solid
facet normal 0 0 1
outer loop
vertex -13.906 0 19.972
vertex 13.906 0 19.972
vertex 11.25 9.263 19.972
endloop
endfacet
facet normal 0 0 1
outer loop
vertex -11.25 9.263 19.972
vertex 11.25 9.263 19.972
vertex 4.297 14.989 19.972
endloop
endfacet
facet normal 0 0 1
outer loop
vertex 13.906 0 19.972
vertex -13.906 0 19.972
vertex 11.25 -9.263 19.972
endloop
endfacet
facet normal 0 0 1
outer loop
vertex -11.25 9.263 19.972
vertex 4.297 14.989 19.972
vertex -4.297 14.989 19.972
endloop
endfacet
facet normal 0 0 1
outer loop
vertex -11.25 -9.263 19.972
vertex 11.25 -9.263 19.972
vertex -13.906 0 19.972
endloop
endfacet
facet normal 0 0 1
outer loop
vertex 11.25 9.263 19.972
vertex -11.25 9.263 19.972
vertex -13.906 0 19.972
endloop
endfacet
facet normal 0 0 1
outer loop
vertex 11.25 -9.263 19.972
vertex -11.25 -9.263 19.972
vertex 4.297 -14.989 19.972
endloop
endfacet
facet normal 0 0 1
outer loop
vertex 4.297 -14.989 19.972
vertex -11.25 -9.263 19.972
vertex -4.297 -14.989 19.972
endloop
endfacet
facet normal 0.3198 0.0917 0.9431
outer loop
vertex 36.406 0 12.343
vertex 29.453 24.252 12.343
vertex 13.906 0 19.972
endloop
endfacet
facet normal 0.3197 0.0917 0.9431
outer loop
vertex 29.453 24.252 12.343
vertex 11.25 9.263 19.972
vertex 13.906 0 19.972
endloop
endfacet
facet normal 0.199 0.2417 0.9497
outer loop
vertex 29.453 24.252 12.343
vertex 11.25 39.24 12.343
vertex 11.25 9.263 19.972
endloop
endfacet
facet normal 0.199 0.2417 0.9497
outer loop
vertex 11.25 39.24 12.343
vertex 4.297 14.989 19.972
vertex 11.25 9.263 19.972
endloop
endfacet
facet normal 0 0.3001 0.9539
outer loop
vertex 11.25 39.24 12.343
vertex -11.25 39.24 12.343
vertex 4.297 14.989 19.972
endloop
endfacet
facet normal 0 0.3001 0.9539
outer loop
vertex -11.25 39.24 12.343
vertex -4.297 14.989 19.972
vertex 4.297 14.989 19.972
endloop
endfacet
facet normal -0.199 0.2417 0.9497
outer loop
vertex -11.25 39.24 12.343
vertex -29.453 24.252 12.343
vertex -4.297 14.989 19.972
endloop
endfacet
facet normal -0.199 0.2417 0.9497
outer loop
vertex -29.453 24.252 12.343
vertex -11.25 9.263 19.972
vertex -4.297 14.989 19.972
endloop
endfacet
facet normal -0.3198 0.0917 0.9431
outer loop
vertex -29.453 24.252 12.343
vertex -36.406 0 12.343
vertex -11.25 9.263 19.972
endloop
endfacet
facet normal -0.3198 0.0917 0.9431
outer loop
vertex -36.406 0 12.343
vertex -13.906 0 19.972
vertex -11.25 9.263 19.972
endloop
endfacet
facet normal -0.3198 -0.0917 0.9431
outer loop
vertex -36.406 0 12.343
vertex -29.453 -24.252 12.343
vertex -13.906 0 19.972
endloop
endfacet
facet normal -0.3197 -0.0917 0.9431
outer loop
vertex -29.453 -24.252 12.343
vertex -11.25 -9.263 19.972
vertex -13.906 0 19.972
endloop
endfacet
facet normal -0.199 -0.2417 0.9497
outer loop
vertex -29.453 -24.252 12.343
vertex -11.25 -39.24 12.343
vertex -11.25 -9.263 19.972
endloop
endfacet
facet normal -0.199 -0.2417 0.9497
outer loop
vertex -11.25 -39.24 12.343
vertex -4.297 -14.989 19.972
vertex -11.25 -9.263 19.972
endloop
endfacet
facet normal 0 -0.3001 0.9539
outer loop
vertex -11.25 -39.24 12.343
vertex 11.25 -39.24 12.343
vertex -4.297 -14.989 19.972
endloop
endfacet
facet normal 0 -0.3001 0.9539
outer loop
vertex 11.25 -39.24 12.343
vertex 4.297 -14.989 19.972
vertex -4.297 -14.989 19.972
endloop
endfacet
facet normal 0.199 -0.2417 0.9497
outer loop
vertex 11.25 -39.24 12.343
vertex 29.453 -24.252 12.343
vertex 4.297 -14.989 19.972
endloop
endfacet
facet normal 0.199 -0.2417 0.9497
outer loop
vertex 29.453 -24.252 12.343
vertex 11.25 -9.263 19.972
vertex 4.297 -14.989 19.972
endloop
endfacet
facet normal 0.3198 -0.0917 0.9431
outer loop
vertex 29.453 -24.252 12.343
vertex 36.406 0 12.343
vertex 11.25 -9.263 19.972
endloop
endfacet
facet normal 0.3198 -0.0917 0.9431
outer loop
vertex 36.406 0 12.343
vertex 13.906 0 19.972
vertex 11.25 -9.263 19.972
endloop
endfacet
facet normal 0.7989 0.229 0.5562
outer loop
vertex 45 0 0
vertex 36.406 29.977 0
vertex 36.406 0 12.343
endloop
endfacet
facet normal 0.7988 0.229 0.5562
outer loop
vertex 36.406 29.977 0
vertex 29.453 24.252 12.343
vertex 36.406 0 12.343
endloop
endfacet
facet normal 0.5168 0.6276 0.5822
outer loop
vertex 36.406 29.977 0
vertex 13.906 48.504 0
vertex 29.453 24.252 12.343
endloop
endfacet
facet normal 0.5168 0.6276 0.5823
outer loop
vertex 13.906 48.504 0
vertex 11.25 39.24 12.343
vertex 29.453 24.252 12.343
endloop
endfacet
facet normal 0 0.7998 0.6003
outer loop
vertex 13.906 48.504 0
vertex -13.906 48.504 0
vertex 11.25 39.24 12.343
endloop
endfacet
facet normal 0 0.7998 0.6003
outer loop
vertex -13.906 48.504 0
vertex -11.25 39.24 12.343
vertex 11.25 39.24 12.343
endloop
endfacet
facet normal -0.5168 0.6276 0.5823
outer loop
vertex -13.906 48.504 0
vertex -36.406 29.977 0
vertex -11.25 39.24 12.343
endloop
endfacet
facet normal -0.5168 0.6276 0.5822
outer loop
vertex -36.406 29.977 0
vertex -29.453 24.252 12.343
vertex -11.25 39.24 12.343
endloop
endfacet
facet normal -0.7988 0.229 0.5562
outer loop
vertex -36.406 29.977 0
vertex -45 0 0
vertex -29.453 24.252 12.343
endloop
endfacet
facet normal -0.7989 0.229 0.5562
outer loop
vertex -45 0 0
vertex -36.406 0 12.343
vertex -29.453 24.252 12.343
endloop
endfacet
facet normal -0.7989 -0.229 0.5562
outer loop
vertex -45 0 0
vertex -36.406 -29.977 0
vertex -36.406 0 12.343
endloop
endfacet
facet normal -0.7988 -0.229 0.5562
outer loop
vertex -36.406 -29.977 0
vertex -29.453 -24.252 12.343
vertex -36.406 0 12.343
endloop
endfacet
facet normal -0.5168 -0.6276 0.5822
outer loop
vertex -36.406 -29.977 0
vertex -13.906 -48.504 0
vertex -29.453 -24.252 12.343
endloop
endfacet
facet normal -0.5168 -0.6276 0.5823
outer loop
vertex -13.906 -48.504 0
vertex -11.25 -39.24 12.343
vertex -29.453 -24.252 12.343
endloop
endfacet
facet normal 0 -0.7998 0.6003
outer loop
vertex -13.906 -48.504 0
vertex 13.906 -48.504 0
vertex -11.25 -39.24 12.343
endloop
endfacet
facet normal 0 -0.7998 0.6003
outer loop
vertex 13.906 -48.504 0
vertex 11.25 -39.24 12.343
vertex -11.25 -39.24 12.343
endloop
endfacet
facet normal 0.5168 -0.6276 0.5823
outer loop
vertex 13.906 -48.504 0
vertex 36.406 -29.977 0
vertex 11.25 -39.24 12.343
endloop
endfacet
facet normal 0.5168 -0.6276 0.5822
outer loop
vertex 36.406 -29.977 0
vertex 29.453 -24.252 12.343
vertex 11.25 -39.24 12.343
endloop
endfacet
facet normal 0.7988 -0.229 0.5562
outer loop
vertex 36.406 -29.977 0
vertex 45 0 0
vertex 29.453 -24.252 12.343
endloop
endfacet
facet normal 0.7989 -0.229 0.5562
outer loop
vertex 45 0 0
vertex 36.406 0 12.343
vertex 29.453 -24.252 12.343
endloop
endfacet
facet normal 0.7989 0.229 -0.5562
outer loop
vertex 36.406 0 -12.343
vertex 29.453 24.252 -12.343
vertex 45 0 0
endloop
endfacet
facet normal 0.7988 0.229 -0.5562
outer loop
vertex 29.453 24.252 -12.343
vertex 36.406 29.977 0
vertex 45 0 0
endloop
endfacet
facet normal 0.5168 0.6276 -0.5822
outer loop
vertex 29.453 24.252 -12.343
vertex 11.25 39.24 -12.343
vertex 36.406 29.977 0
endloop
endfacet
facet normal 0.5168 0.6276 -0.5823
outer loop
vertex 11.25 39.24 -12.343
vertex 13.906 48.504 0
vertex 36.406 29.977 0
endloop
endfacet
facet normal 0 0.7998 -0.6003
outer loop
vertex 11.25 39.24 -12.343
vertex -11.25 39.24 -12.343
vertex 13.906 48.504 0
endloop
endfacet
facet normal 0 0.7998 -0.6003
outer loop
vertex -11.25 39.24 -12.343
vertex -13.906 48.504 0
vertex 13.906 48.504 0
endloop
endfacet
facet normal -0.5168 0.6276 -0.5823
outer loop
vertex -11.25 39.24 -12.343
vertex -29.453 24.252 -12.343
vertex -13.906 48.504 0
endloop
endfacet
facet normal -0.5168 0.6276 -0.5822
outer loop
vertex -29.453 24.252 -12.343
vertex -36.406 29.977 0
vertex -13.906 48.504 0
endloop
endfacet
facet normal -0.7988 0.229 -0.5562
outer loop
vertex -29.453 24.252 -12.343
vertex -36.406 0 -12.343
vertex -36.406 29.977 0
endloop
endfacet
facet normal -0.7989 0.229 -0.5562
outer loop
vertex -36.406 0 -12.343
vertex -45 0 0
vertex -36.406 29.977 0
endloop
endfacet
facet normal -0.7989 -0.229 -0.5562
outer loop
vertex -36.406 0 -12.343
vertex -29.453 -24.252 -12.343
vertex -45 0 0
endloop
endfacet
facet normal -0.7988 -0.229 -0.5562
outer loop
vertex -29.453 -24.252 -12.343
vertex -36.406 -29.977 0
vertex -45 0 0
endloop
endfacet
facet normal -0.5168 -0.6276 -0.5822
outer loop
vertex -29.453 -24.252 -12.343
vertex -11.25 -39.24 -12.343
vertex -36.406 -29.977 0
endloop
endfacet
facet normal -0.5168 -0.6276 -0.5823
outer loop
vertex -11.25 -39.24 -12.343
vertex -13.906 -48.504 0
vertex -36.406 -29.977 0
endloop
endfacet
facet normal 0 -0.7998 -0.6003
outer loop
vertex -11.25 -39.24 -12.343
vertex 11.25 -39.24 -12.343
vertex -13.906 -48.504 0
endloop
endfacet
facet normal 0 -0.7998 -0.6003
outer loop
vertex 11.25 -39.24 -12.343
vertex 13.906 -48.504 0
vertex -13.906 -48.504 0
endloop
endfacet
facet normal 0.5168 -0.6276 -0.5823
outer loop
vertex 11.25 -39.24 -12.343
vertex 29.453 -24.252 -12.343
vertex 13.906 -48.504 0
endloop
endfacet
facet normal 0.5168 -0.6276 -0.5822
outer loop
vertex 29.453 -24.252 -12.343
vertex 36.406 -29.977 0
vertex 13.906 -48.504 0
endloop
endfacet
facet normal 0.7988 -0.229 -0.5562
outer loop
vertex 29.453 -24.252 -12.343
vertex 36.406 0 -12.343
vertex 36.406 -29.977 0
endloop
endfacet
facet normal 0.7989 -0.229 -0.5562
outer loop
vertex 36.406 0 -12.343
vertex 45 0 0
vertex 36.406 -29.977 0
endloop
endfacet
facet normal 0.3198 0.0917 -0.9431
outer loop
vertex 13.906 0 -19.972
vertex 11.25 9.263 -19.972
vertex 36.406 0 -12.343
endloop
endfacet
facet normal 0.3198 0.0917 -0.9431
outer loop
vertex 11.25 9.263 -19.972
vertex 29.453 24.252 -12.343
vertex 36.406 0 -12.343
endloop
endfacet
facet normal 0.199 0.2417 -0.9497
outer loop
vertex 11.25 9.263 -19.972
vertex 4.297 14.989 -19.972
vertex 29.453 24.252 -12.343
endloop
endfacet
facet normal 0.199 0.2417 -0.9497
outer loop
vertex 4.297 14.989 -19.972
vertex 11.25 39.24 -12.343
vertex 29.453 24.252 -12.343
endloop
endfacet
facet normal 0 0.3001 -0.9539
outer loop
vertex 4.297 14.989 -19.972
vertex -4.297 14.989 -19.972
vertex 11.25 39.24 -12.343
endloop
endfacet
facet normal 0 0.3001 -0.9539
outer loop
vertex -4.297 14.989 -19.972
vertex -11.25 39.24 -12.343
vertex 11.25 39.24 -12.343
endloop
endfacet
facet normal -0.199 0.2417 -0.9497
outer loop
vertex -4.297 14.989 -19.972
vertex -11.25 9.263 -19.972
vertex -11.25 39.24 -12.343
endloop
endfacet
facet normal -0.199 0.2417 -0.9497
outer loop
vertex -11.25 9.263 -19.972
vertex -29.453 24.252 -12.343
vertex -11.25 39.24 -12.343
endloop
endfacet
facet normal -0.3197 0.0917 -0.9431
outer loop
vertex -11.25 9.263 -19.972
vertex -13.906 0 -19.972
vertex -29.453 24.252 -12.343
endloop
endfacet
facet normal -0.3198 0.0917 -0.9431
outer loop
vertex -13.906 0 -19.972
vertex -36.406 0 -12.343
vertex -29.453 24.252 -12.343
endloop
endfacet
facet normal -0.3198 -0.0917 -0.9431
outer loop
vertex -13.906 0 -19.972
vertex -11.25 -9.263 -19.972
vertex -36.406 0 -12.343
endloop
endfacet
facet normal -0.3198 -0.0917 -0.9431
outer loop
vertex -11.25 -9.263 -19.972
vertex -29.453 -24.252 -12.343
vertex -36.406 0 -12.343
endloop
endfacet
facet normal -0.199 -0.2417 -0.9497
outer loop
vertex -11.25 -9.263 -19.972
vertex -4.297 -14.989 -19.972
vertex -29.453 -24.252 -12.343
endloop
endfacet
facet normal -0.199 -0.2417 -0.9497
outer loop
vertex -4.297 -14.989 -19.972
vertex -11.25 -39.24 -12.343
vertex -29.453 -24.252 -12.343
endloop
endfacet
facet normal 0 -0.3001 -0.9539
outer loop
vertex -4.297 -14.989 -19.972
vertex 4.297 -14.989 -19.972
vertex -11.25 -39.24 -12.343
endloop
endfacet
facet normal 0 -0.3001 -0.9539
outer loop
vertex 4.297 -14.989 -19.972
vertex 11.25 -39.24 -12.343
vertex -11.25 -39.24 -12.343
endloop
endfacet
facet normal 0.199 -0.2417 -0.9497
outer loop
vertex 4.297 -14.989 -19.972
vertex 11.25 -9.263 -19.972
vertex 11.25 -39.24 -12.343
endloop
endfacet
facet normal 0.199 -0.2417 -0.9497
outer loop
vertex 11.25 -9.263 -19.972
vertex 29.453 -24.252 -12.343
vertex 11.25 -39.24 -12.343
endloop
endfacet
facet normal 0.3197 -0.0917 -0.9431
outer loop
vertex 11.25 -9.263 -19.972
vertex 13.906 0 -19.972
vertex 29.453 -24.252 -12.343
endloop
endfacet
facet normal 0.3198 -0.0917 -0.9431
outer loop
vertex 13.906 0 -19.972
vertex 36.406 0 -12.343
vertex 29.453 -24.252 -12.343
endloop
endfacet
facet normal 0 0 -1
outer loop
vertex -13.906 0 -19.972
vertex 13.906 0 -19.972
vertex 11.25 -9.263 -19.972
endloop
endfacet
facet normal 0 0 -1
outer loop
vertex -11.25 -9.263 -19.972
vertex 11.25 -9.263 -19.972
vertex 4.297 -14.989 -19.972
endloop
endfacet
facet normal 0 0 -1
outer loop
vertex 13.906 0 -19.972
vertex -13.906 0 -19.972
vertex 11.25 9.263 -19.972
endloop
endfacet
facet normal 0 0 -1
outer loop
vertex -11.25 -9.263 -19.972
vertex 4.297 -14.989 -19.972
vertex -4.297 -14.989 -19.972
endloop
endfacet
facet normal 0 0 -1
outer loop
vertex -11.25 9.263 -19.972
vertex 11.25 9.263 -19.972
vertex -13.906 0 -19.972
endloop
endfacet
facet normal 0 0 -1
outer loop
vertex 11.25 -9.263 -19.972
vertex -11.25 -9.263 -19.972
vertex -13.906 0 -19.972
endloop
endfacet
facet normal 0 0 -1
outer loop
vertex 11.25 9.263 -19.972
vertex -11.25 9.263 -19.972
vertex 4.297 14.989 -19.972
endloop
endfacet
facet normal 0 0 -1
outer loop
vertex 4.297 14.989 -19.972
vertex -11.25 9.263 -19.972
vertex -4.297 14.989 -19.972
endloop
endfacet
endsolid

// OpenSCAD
// Generated by SolidPython 1.0.1 on 2020-07-29 00:46:52


scale(v = [15, 17, 7]) {
	sphere(r = 3);
}
/***********************************************
*********      SolidPython code:      **********
************************************************
 
# import packages: SolidPython
from solid import *
from solid.utils import *
from itertools import chain, combinations, permutations


class Resize:

    def __init__(self, scad_file):
        self.scad_file = scad_file
        #self.scad_file = import_scad(scad_file)
        # cone/cylinder param:
        self.r1 = 0
        self.r2 = 0
        self.h = 0
        # rectangular prism param:
        self.w = 0
        self.l = 0
        # ellipse param:
        self.r = 0

    # import OpenScad code (file name corresponds to shape)


    # classify shape + parameters
    def assign(self, param1, param2, param3):
        if self.scad_file == 'cone.scad':
            self.r1 = param1
            self.r2 = param2
            self.h = param3
        elif self.scad_file == 'cylinder.scad':
            self.r1 = param1
            self.r2 = param2
            self.h = param3
        elif self.scad_file == 'rectangularPrism.scad':
            self.h = param1
            self.l = param2
            self.w = param3
        else:
            self.r = param1
            self.h = param2

    # resize parameters
    def iterate(self):
        x = range(3, 20, 2)
        i = 1
        if self.scad_file == 'cone.scad':
            tempList = list(permutations(x, 2))
            for temp in tempList:
                param1 = temp[0]
                param2 = temp[1]
                filepath = 'produced_scad_files/' + 'cone' + str(param1) + '_' + str(param2) + '_' + '.scad'
                scad_render_to_file(cylinder(h=param1, r1=param2, r2=0), filepath)

        elif self.scad_file == 'cylinder.scad':
            tempList = list(permutations(x, 3))
            for temp in tempList:
                param1 = temp[0]
                param2 = temp[1]
                filepath = 'produced_scad_files/' + 'cylinder' + str(param1) + '_' + str(param2) + '_' + '.scad'
                scad_render_to_file(cylinder(h=param1, r1=param2, r2=param2), filepath)

        elif self.scad_file == 'rectangularPrism.scad':
            tempList = list(permutations(x, 3))
            for temp in tempList:
                param1 = temp[0]
                param2 = temp[1]
                param3 = temp[2]
                filepath = 'produced_scad_files/' + 'rectangularPrism' + str(param1) + '_' + str(param2) + '_' + str(
                    param3) + '.scad'
                scad_render_to_file(cube(size=(param1, param2, param3)), filepath)

        elif self.scad_file == 'ellipse.scad':
            tempList = list(permutations(x, 4))
            for temp in tempList:
                param1 = temp[0]
                param2 = temp[1]
                param3 = temp[2]
                param4 = temp[3]
                filepath = 'produced_scad_files/' + 'ellipse' + str(param1) + '_' + str(param2) + '_' + str(param3) + '_' + str(param4) + '.scad'
                scad_render_to_file(scale([param1, param2, param3])(sphere(r=param4)), filepath)

    def render_to_scadfile(self):
        scad_render_to_file(scad, 'example.scad') 
 
************************************************/
